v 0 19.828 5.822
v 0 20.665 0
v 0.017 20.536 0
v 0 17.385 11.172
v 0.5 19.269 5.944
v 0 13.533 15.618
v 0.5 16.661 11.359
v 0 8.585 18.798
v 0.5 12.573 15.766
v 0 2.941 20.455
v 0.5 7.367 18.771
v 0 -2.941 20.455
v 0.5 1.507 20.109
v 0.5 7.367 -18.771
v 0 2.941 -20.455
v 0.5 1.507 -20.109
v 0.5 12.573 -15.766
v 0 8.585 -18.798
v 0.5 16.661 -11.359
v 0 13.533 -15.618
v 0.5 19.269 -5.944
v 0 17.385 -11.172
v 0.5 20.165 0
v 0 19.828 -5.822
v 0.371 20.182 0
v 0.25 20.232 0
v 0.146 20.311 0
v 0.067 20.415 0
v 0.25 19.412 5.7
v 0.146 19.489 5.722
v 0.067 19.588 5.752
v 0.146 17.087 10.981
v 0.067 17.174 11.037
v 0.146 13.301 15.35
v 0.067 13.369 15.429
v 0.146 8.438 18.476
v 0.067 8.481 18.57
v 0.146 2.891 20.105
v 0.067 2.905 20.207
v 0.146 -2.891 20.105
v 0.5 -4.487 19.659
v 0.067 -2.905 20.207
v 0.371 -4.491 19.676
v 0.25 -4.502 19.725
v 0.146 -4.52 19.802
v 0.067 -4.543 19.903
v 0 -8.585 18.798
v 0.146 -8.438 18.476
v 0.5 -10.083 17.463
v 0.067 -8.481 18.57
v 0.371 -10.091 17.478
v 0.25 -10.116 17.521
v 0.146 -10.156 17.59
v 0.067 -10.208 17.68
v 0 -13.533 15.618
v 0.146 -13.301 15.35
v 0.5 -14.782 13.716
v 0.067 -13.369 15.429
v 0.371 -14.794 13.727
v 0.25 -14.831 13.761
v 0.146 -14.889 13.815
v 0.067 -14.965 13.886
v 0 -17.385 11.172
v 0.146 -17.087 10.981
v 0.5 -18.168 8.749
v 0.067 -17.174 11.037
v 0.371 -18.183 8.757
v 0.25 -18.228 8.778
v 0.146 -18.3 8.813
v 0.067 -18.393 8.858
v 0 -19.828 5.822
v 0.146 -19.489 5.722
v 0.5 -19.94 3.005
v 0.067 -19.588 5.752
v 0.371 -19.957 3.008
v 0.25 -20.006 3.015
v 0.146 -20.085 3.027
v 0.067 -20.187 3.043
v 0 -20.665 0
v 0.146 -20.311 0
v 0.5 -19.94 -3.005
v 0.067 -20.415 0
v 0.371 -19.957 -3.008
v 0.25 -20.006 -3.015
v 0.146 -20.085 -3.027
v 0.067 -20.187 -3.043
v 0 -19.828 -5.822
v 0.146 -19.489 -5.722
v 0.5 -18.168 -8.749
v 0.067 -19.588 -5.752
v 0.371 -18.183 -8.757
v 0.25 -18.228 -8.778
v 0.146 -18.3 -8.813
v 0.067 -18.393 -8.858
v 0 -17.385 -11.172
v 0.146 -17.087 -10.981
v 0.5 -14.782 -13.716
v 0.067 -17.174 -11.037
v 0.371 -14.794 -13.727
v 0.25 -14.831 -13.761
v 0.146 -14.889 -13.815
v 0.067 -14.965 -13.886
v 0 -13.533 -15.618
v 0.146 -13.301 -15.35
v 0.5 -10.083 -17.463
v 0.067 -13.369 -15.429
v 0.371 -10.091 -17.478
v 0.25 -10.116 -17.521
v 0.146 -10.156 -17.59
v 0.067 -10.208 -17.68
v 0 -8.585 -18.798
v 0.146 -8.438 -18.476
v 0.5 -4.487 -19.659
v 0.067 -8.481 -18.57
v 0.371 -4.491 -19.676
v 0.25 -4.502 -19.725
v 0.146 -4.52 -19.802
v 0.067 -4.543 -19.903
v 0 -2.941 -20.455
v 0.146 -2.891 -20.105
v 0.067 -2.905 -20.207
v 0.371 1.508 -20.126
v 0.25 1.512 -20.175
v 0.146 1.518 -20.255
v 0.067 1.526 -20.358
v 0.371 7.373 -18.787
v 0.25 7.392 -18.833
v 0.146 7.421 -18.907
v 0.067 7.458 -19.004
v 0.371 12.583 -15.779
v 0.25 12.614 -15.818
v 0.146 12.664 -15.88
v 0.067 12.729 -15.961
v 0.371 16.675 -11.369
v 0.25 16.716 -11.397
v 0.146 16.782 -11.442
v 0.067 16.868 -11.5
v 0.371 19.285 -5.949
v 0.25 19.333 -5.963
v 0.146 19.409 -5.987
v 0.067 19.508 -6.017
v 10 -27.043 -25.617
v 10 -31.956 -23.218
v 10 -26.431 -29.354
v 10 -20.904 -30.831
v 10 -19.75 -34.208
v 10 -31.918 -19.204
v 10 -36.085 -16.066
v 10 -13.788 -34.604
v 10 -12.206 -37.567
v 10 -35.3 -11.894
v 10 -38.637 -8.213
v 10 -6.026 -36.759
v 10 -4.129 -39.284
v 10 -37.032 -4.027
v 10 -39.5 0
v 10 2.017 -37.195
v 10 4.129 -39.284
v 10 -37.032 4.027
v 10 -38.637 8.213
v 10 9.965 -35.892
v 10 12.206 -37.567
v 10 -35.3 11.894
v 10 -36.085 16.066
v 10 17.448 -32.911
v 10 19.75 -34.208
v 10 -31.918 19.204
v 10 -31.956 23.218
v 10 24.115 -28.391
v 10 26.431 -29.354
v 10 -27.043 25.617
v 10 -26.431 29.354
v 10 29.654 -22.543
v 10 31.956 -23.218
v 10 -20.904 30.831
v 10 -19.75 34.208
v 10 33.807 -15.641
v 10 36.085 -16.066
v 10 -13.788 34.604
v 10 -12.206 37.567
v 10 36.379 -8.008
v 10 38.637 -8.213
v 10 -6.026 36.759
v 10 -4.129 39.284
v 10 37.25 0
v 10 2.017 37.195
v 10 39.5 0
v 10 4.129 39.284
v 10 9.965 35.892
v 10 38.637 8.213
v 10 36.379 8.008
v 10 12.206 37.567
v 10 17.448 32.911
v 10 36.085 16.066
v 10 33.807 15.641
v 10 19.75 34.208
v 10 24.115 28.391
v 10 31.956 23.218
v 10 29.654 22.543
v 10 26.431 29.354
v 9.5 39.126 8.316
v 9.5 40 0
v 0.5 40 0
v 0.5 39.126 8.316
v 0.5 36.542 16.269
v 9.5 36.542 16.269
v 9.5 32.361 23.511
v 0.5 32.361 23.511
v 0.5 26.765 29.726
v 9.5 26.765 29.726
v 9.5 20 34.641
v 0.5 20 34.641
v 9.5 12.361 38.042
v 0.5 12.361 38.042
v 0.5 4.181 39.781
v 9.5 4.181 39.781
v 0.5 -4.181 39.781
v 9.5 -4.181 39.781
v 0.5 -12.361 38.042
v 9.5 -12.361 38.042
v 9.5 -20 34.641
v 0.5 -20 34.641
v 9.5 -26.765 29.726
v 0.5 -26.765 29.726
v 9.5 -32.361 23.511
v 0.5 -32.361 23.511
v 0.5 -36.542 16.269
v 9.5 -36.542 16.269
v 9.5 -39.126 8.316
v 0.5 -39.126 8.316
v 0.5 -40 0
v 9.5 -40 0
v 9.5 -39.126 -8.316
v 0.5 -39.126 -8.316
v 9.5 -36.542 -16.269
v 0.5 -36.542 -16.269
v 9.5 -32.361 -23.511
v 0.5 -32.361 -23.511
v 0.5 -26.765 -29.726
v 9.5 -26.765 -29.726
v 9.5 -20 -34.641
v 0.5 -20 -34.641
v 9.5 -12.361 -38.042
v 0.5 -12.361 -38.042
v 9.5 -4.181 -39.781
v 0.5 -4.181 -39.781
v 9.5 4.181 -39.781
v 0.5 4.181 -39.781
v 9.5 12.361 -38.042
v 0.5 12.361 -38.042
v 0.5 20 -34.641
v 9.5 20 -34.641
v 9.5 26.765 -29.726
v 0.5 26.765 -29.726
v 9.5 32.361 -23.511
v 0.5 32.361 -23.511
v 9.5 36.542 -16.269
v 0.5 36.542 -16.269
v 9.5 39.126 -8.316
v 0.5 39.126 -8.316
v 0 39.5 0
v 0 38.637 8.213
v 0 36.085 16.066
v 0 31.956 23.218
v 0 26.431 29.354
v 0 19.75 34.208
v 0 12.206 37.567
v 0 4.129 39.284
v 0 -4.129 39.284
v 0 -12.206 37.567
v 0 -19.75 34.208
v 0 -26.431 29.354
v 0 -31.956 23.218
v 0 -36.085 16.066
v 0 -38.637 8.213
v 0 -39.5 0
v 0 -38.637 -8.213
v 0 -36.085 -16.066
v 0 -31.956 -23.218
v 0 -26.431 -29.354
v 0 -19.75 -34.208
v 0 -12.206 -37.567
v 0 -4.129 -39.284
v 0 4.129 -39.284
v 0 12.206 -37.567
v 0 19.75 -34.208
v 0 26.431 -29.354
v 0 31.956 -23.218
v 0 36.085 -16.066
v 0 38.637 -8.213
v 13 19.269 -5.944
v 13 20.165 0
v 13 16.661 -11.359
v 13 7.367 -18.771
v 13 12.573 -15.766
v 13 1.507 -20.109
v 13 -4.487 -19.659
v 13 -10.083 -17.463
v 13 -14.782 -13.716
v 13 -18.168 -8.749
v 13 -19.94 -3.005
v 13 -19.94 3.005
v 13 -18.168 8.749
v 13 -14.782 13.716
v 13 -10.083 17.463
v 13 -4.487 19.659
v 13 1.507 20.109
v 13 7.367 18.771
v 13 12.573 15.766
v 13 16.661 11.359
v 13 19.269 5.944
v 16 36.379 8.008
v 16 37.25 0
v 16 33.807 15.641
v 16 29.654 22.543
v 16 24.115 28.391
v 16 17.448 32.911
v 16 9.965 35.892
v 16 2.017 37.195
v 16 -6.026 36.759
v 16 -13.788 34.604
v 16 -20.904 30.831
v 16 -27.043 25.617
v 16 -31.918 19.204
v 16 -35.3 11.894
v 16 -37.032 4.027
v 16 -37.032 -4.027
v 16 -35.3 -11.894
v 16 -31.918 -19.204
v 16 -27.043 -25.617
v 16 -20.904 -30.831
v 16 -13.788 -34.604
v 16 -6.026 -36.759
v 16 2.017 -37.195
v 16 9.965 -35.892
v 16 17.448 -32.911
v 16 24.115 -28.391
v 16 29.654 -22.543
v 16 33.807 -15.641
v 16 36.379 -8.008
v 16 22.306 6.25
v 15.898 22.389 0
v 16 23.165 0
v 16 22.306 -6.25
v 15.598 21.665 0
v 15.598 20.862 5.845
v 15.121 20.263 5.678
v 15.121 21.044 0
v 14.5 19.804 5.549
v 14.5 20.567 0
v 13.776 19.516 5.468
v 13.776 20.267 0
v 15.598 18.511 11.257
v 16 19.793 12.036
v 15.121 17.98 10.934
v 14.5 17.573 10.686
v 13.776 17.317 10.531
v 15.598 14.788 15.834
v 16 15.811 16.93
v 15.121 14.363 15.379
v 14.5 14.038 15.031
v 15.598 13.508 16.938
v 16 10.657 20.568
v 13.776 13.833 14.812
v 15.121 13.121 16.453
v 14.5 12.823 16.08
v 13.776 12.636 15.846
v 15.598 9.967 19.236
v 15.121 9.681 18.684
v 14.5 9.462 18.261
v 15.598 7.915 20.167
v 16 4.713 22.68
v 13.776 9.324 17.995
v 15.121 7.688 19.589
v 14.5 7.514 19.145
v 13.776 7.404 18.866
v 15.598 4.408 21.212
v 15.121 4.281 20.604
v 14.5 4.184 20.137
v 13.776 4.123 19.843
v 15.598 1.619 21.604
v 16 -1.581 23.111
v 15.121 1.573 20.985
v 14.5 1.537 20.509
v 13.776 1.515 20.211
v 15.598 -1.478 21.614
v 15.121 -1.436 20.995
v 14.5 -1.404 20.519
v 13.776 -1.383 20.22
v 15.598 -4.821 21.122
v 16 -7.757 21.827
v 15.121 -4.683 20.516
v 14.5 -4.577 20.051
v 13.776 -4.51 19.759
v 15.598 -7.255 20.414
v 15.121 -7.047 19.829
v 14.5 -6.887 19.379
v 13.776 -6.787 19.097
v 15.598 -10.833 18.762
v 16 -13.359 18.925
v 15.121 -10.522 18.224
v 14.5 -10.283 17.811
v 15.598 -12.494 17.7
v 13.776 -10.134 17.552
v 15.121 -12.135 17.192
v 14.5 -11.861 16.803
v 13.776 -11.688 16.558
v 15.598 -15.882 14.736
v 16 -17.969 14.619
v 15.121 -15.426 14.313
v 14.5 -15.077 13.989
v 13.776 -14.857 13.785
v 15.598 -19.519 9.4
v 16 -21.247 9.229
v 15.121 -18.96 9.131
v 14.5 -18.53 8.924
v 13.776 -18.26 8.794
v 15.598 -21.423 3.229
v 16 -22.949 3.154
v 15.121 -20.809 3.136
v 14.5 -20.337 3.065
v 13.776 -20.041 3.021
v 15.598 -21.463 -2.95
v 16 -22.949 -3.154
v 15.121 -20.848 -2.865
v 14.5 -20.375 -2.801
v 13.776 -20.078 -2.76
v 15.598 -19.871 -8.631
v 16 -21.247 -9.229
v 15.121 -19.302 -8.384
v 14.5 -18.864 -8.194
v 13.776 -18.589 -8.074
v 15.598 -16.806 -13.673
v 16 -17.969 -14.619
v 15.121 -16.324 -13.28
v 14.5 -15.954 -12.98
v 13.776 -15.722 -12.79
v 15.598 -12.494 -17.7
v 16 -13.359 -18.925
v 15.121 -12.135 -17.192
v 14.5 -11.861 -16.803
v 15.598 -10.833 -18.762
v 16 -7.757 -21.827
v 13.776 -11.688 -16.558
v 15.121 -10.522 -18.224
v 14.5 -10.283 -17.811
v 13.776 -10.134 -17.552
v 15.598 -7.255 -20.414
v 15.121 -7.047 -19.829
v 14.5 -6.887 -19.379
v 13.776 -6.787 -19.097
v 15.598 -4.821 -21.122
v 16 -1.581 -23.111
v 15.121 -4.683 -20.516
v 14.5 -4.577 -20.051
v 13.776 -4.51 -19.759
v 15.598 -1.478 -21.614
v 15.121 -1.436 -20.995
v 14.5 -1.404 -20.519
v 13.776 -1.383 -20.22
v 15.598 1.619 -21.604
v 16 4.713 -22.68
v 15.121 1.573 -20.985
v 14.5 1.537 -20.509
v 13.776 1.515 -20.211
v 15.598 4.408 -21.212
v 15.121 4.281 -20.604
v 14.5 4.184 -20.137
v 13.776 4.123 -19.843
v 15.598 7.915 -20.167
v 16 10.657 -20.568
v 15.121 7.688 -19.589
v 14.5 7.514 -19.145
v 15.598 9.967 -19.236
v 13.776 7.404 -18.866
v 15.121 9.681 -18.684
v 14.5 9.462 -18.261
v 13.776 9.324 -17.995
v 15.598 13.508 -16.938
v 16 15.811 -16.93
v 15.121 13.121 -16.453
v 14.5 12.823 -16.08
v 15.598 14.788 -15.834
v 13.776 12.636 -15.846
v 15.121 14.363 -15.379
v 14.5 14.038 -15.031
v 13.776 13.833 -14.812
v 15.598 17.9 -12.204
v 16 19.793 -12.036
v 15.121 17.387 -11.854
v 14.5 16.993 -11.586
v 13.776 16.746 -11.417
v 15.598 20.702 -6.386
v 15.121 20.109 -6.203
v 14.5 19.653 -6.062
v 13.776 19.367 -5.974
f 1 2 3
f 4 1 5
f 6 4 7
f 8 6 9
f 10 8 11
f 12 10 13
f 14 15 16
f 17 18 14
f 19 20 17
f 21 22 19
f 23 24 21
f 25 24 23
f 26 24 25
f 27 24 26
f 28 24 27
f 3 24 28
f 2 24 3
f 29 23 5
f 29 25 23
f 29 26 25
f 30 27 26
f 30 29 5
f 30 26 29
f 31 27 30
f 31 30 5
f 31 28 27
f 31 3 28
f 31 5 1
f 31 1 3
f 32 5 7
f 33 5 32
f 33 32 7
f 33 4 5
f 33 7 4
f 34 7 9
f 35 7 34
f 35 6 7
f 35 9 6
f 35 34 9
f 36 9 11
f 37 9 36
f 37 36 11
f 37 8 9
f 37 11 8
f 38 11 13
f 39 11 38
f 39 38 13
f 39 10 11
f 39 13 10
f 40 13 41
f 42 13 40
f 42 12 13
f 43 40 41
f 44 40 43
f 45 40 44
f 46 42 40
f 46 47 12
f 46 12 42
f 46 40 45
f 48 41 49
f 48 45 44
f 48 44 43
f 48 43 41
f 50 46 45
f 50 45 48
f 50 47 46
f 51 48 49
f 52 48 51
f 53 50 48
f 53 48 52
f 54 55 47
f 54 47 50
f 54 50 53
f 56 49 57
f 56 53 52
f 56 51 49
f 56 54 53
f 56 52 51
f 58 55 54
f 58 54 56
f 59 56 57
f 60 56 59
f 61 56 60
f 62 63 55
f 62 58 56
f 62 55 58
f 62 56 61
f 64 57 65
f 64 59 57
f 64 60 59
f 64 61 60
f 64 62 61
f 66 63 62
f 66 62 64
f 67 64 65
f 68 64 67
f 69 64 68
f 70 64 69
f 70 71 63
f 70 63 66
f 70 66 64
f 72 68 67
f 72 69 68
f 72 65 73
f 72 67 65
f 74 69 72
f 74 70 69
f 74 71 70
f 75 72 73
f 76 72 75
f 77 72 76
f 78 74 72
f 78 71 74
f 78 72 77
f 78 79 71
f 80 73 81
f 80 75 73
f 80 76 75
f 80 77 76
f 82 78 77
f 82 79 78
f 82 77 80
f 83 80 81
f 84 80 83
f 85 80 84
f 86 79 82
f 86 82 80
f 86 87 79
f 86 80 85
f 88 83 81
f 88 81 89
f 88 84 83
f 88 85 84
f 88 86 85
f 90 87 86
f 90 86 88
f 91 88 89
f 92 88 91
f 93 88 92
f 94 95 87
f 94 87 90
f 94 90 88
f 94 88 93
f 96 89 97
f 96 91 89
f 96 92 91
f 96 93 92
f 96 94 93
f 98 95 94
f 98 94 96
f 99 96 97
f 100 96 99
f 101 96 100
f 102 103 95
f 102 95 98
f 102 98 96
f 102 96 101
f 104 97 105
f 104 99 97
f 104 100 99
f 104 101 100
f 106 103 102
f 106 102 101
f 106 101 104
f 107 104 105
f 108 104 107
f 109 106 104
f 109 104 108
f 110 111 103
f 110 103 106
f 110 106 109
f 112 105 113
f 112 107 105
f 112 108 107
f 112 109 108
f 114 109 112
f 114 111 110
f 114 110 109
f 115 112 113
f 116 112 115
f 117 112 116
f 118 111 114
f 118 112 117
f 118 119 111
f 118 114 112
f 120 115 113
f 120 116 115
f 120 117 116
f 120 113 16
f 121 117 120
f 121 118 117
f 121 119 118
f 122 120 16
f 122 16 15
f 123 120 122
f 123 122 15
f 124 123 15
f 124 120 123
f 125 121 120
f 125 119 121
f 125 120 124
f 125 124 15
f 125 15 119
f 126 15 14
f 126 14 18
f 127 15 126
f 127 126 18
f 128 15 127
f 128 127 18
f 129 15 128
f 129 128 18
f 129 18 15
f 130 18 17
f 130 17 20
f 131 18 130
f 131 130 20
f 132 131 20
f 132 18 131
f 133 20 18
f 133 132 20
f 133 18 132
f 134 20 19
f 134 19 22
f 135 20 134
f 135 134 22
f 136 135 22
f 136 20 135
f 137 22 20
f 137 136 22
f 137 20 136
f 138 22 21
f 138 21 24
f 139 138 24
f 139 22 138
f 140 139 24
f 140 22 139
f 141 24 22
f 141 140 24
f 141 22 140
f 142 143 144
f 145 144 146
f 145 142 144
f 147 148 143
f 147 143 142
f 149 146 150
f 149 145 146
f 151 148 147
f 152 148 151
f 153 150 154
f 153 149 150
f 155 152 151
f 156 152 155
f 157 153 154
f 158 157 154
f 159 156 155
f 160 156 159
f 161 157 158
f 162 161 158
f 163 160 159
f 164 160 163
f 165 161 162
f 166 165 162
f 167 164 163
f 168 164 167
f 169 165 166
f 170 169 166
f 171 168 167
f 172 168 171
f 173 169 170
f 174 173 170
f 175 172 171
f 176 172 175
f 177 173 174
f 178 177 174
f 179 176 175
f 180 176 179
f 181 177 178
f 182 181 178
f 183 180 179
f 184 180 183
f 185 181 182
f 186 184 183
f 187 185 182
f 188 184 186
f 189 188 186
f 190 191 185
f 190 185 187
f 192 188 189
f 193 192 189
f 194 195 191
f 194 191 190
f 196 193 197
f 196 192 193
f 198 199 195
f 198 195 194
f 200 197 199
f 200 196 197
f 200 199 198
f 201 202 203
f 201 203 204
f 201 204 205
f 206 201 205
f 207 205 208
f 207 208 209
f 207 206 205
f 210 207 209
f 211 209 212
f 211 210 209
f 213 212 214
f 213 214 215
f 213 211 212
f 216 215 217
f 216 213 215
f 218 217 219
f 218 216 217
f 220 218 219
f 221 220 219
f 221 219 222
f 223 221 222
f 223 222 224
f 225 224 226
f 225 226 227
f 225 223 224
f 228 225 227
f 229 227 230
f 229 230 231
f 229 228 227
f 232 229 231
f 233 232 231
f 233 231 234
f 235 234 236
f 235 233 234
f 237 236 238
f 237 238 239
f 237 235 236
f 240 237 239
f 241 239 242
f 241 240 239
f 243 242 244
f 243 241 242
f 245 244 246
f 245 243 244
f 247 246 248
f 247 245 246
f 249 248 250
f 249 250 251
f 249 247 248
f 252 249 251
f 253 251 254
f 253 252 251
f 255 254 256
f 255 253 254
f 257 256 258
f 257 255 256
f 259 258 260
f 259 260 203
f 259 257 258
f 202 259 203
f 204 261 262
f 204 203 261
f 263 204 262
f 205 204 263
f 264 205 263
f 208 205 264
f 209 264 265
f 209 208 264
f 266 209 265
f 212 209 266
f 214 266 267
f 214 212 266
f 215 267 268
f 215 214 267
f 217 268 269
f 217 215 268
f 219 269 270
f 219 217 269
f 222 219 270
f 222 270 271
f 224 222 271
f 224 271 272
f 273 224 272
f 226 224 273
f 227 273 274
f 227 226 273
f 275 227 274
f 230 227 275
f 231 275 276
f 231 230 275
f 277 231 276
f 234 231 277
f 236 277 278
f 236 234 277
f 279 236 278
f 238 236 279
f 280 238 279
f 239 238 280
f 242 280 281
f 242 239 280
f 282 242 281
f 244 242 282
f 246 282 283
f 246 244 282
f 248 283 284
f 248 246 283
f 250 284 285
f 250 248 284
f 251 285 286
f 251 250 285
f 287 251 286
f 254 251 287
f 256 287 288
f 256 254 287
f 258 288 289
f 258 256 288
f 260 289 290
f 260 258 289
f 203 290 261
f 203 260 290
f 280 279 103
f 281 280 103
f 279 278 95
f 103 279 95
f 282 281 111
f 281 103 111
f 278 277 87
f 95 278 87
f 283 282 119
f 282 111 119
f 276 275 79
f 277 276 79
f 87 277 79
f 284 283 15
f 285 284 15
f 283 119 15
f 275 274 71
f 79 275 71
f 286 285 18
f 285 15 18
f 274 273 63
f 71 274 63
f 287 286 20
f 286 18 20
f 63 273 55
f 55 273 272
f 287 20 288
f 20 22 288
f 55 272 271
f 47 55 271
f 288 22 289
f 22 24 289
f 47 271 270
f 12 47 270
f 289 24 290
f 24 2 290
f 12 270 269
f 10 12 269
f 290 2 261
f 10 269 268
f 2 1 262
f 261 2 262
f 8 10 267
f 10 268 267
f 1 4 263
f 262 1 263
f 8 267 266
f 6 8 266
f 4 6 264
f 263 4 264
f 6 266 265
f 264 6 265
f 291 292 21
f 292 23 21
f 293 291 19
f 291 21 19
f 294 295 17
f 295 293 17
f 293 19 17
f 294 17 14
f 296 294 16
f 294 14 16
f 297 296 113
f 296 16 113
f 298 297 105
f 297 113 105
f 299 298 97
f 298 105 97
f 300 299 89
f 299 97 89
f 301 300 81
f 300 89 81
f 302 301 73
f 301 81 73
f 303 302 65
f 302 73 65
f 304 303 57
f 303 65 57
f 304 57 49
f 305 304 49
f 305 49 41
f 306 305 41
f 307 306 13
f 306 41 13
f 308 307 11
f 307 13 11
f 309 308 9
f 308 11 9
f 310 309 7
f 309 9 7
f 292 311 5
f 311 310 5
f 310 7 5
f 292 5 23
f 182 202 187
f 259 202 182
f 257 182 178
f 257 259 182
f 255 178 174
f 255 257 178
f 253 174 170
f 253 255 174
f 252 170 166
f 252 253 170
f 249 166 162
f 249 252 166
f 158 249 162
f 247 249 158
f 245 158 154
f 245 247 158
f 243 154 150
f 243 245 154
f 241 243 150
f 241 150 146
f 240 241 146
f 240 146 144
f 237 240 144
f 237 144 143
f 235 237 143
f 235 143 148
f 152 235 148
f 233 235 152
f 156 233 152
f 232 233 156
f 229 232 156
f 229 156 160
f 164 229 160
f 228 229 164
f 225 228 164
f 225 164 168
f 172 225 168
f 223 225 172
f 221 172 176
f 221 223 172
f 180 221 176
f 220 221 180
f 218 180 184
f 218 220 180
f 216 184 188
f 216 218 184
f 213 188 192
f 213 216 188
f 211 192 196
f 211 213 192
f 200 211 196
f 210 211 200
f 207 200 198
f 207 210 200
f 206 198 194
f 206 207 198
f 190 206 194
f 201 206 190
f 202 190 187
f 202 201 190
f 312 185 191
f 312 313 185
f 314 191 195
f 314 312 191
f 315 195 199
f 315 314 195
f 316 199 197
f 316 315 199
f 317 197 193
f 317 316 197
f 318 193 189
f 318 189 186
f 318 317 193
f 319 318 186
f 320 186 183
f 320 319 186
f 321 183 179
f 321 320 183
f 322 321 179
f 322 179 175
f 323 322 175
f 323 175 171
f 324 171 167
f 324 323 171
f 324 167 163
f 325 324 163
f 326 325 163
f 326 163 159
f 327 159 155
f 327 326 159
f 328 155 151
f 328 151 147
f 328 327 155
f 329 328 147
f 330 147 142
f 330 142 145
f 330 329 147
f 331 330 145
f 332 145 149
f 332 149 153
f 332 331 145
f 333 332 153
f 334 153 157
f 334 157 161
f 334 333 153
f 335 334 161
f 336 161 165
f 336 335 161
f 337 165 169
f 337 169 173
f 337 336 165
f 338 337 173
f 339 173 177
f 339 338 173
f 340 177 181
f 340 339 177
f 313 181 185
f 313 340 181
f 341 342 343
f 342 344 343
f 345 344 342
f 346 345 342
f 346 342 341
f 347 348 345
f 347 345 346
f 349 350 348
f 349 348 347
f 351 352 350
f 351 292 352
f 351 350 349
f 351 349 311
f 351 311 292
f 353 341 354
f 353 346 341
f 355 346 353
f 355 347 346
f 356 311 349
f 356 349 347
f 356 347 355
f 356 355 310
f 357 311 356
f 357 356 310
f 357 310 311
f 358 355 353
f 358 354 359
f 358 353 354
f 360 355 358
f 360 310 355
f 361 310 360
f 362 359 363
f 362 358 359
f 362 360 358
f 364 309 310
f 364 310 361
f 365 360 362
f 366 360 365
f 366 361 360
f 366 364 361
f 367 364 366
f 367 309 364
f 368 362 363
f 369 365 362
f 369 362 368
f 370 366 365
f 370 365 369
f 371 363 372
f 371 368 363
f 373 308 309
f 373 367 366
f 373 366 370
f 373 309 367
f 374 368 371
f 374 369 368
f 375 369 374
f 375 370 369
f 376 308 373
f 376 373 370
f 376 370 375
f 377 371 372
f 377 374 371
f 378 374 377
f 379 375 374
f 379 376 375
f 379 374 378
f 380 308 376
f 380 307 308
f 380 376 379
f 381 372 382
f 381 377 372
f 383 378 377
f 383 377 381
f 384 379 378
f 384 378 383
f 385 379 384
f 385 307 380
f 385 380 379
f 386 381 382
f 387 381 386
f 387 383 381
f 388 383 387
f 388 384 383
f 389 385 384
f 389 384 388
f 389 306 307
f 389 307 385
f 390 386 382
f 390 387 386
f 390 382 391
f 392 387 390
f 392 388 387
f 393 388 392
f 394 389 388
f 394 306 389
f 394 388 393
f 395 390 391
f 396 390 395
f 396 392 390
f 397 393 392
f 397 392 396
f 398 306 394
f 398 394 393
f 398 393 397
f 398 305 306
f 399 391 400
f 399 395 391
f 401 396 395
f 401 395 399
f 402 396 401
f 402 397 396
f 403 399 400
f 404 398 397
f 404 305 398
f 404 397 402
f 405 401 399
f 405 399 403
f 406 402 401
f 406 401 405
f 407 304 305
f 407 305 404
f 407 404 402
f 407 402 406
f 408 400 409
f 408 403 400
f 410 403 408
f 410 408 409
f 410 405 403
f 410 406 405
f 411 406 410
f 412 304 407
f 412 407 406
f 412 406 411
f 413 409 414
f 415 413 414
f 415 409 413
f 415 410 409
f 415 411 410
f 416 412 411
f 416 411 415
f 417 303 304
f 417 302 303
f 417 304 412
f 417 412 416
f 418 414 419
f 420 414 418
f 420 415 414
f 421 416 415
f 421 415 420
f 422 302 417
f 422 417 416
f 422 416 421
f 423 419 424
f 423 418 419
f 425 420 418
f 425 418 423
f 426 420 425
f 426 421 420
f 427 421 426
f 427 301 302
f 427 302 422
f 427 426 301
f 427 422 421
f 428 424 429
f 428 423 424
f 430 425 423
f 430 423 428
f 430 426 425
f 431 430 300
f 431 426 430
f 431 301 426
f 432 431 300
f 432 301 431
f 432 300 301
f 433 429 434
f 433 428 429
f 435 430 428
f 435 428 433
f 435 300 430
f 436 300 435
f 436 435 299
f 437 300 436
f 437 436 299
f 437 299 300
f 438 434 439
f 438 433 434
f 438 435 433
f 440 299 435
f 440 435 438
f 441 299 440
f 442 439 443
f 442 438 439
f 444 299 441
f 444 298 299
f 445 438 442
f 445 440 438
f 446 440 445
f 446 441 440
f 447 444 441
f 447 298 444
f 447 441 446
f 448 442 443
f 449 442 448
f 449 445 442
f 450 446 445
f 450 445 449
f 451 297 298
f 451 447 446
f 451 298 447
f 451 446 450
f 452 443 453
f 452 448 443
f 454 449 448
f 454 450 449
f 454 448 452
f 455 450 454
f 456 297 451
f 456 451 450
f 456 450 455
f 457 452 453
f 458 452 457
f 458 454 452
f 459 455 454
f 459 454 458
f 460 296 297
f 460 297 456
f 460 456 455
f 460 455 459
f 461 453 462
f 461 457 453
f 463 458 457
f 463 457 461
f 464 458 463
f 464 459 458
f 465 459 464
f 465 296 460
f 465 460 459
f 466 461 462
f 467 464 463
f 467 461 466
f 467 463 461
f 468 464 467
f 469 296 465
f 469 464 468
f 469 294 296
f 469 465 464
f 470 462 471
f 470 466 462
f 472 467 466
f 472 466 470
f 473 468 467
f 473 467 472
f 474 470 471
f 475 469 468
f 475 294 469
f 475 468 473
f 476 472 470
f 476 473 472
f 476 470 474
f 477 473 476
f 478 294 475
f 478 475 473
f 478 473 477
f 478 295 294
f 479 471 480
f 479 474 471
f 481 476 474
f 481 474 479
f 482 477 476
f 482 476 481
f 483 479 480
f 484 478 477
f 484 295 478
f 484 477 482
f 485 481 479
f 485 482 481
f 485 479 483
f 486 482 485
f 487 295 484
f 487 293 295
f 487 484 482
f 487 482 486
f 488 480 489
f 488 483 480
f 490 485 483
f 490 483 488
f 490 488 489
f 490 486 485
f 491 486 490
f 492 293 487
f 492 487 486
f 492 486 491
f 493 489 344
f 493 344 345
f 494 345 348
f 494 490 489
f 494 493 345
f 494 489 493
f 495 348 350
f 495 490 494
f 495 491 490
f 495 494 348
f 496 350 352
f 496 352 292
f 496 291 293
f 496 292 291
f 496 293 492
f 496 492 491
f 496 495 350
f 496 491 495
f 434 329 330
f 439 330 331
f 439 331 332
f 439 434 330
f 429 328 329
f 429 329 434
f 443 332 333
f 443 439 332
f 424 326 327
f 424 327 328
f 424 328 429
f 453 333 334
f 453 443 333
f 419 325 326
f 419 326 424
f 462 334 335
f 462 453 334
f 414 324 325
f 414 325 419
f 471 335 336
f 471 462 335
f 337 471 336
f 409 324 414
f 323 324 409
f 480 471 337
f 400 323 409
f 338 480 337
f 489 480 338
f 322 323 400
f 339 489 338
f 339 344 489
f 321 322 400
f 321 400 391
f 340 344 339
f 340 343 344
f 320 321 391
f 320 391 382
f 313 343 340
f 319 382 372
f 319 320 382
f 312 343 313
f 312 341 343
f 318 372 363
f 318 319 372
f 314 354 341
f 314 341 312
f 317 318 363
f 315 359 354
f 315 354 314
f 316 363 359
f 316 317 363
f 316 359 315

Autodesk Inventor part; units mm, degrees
ref_plane "YZ Plane" through (0, 0, 0) normal (1, 0, 0) x (0, 1, 0)
ref_plane "XZ Plane" through (0, 0, 0) normal (0, 1, 0) x (-1, 0, 0)
ref_plane "XY Plane" through (0, 0, 0) normal (0, 0, 1) x (1, 0, 0)
sketch "Náčrt1" plane through (0, 0, 0) normal (0, 0, 1) x (1, 0, 0)
  line L0 (0, 0) -> (18.405, 0)
  line L1 (0, 20.165) -> (0, 40)
  line L2 (0, 40) -> (10, 40)
  line L3 (10, 40) -> (10, 37.25)
  line L4 (10, 37.25) -> (16, 37.25)
  line L5 (16, 37.25) -> (16, 20.165)
  line L6 (16, 20.165) -> (0, 20.165)
  dimension "d0" = 80
  dimension "d1" = 40.33
  dimension "d2" = 74.5
  dimension "d3" = 16
  dimension "d4" = 10
revolve "Rotace1" add sketch "Náčrt1" angle 360 about axis through (0, 0, 0) along (1, 0, 0)
fillet "Zaoblení1" radius 3 1 edges at (16, -20.165, 0)
fillet "Zaoblení2" radius 0.5 1 edges at (0, -20.165, 0)
chamfer "Zkosení1" distance 0.5 angle 45 2 edges at (0, -40, 0) (10, -40, 0)
equation "\"PoloměrOhybu\" = Tloušťka"
equation "\"ŠířkaVýštipu\" = Tloušťka"
equation "\"HloubkaVýštipu\" = 0.5 * Tloušťka"
equation "\"VelikostRohovéhoVýštipu\" = 4 * Tloušťka"
equation "\"MinimálníZbytek\" = 2 * Tloušťka"
equation "\"PřechodovýPoloměr\" = PoloměrOhybu"
equation "\"VelikostJacobihoPoloměru\" = Tloušťka"
equation "\"VelikostMezery\" = Tloušťka"
equation "\"Rozmer_B\" = 0"
equation "\"Rozmer_C\" = Tloušťka"
equation "\"Rozmer_D\" = d3"
equation "\"Tloušťka\" = 0.5"
properties part number "NA-45-h-Crown-217" material "19 436.4"
